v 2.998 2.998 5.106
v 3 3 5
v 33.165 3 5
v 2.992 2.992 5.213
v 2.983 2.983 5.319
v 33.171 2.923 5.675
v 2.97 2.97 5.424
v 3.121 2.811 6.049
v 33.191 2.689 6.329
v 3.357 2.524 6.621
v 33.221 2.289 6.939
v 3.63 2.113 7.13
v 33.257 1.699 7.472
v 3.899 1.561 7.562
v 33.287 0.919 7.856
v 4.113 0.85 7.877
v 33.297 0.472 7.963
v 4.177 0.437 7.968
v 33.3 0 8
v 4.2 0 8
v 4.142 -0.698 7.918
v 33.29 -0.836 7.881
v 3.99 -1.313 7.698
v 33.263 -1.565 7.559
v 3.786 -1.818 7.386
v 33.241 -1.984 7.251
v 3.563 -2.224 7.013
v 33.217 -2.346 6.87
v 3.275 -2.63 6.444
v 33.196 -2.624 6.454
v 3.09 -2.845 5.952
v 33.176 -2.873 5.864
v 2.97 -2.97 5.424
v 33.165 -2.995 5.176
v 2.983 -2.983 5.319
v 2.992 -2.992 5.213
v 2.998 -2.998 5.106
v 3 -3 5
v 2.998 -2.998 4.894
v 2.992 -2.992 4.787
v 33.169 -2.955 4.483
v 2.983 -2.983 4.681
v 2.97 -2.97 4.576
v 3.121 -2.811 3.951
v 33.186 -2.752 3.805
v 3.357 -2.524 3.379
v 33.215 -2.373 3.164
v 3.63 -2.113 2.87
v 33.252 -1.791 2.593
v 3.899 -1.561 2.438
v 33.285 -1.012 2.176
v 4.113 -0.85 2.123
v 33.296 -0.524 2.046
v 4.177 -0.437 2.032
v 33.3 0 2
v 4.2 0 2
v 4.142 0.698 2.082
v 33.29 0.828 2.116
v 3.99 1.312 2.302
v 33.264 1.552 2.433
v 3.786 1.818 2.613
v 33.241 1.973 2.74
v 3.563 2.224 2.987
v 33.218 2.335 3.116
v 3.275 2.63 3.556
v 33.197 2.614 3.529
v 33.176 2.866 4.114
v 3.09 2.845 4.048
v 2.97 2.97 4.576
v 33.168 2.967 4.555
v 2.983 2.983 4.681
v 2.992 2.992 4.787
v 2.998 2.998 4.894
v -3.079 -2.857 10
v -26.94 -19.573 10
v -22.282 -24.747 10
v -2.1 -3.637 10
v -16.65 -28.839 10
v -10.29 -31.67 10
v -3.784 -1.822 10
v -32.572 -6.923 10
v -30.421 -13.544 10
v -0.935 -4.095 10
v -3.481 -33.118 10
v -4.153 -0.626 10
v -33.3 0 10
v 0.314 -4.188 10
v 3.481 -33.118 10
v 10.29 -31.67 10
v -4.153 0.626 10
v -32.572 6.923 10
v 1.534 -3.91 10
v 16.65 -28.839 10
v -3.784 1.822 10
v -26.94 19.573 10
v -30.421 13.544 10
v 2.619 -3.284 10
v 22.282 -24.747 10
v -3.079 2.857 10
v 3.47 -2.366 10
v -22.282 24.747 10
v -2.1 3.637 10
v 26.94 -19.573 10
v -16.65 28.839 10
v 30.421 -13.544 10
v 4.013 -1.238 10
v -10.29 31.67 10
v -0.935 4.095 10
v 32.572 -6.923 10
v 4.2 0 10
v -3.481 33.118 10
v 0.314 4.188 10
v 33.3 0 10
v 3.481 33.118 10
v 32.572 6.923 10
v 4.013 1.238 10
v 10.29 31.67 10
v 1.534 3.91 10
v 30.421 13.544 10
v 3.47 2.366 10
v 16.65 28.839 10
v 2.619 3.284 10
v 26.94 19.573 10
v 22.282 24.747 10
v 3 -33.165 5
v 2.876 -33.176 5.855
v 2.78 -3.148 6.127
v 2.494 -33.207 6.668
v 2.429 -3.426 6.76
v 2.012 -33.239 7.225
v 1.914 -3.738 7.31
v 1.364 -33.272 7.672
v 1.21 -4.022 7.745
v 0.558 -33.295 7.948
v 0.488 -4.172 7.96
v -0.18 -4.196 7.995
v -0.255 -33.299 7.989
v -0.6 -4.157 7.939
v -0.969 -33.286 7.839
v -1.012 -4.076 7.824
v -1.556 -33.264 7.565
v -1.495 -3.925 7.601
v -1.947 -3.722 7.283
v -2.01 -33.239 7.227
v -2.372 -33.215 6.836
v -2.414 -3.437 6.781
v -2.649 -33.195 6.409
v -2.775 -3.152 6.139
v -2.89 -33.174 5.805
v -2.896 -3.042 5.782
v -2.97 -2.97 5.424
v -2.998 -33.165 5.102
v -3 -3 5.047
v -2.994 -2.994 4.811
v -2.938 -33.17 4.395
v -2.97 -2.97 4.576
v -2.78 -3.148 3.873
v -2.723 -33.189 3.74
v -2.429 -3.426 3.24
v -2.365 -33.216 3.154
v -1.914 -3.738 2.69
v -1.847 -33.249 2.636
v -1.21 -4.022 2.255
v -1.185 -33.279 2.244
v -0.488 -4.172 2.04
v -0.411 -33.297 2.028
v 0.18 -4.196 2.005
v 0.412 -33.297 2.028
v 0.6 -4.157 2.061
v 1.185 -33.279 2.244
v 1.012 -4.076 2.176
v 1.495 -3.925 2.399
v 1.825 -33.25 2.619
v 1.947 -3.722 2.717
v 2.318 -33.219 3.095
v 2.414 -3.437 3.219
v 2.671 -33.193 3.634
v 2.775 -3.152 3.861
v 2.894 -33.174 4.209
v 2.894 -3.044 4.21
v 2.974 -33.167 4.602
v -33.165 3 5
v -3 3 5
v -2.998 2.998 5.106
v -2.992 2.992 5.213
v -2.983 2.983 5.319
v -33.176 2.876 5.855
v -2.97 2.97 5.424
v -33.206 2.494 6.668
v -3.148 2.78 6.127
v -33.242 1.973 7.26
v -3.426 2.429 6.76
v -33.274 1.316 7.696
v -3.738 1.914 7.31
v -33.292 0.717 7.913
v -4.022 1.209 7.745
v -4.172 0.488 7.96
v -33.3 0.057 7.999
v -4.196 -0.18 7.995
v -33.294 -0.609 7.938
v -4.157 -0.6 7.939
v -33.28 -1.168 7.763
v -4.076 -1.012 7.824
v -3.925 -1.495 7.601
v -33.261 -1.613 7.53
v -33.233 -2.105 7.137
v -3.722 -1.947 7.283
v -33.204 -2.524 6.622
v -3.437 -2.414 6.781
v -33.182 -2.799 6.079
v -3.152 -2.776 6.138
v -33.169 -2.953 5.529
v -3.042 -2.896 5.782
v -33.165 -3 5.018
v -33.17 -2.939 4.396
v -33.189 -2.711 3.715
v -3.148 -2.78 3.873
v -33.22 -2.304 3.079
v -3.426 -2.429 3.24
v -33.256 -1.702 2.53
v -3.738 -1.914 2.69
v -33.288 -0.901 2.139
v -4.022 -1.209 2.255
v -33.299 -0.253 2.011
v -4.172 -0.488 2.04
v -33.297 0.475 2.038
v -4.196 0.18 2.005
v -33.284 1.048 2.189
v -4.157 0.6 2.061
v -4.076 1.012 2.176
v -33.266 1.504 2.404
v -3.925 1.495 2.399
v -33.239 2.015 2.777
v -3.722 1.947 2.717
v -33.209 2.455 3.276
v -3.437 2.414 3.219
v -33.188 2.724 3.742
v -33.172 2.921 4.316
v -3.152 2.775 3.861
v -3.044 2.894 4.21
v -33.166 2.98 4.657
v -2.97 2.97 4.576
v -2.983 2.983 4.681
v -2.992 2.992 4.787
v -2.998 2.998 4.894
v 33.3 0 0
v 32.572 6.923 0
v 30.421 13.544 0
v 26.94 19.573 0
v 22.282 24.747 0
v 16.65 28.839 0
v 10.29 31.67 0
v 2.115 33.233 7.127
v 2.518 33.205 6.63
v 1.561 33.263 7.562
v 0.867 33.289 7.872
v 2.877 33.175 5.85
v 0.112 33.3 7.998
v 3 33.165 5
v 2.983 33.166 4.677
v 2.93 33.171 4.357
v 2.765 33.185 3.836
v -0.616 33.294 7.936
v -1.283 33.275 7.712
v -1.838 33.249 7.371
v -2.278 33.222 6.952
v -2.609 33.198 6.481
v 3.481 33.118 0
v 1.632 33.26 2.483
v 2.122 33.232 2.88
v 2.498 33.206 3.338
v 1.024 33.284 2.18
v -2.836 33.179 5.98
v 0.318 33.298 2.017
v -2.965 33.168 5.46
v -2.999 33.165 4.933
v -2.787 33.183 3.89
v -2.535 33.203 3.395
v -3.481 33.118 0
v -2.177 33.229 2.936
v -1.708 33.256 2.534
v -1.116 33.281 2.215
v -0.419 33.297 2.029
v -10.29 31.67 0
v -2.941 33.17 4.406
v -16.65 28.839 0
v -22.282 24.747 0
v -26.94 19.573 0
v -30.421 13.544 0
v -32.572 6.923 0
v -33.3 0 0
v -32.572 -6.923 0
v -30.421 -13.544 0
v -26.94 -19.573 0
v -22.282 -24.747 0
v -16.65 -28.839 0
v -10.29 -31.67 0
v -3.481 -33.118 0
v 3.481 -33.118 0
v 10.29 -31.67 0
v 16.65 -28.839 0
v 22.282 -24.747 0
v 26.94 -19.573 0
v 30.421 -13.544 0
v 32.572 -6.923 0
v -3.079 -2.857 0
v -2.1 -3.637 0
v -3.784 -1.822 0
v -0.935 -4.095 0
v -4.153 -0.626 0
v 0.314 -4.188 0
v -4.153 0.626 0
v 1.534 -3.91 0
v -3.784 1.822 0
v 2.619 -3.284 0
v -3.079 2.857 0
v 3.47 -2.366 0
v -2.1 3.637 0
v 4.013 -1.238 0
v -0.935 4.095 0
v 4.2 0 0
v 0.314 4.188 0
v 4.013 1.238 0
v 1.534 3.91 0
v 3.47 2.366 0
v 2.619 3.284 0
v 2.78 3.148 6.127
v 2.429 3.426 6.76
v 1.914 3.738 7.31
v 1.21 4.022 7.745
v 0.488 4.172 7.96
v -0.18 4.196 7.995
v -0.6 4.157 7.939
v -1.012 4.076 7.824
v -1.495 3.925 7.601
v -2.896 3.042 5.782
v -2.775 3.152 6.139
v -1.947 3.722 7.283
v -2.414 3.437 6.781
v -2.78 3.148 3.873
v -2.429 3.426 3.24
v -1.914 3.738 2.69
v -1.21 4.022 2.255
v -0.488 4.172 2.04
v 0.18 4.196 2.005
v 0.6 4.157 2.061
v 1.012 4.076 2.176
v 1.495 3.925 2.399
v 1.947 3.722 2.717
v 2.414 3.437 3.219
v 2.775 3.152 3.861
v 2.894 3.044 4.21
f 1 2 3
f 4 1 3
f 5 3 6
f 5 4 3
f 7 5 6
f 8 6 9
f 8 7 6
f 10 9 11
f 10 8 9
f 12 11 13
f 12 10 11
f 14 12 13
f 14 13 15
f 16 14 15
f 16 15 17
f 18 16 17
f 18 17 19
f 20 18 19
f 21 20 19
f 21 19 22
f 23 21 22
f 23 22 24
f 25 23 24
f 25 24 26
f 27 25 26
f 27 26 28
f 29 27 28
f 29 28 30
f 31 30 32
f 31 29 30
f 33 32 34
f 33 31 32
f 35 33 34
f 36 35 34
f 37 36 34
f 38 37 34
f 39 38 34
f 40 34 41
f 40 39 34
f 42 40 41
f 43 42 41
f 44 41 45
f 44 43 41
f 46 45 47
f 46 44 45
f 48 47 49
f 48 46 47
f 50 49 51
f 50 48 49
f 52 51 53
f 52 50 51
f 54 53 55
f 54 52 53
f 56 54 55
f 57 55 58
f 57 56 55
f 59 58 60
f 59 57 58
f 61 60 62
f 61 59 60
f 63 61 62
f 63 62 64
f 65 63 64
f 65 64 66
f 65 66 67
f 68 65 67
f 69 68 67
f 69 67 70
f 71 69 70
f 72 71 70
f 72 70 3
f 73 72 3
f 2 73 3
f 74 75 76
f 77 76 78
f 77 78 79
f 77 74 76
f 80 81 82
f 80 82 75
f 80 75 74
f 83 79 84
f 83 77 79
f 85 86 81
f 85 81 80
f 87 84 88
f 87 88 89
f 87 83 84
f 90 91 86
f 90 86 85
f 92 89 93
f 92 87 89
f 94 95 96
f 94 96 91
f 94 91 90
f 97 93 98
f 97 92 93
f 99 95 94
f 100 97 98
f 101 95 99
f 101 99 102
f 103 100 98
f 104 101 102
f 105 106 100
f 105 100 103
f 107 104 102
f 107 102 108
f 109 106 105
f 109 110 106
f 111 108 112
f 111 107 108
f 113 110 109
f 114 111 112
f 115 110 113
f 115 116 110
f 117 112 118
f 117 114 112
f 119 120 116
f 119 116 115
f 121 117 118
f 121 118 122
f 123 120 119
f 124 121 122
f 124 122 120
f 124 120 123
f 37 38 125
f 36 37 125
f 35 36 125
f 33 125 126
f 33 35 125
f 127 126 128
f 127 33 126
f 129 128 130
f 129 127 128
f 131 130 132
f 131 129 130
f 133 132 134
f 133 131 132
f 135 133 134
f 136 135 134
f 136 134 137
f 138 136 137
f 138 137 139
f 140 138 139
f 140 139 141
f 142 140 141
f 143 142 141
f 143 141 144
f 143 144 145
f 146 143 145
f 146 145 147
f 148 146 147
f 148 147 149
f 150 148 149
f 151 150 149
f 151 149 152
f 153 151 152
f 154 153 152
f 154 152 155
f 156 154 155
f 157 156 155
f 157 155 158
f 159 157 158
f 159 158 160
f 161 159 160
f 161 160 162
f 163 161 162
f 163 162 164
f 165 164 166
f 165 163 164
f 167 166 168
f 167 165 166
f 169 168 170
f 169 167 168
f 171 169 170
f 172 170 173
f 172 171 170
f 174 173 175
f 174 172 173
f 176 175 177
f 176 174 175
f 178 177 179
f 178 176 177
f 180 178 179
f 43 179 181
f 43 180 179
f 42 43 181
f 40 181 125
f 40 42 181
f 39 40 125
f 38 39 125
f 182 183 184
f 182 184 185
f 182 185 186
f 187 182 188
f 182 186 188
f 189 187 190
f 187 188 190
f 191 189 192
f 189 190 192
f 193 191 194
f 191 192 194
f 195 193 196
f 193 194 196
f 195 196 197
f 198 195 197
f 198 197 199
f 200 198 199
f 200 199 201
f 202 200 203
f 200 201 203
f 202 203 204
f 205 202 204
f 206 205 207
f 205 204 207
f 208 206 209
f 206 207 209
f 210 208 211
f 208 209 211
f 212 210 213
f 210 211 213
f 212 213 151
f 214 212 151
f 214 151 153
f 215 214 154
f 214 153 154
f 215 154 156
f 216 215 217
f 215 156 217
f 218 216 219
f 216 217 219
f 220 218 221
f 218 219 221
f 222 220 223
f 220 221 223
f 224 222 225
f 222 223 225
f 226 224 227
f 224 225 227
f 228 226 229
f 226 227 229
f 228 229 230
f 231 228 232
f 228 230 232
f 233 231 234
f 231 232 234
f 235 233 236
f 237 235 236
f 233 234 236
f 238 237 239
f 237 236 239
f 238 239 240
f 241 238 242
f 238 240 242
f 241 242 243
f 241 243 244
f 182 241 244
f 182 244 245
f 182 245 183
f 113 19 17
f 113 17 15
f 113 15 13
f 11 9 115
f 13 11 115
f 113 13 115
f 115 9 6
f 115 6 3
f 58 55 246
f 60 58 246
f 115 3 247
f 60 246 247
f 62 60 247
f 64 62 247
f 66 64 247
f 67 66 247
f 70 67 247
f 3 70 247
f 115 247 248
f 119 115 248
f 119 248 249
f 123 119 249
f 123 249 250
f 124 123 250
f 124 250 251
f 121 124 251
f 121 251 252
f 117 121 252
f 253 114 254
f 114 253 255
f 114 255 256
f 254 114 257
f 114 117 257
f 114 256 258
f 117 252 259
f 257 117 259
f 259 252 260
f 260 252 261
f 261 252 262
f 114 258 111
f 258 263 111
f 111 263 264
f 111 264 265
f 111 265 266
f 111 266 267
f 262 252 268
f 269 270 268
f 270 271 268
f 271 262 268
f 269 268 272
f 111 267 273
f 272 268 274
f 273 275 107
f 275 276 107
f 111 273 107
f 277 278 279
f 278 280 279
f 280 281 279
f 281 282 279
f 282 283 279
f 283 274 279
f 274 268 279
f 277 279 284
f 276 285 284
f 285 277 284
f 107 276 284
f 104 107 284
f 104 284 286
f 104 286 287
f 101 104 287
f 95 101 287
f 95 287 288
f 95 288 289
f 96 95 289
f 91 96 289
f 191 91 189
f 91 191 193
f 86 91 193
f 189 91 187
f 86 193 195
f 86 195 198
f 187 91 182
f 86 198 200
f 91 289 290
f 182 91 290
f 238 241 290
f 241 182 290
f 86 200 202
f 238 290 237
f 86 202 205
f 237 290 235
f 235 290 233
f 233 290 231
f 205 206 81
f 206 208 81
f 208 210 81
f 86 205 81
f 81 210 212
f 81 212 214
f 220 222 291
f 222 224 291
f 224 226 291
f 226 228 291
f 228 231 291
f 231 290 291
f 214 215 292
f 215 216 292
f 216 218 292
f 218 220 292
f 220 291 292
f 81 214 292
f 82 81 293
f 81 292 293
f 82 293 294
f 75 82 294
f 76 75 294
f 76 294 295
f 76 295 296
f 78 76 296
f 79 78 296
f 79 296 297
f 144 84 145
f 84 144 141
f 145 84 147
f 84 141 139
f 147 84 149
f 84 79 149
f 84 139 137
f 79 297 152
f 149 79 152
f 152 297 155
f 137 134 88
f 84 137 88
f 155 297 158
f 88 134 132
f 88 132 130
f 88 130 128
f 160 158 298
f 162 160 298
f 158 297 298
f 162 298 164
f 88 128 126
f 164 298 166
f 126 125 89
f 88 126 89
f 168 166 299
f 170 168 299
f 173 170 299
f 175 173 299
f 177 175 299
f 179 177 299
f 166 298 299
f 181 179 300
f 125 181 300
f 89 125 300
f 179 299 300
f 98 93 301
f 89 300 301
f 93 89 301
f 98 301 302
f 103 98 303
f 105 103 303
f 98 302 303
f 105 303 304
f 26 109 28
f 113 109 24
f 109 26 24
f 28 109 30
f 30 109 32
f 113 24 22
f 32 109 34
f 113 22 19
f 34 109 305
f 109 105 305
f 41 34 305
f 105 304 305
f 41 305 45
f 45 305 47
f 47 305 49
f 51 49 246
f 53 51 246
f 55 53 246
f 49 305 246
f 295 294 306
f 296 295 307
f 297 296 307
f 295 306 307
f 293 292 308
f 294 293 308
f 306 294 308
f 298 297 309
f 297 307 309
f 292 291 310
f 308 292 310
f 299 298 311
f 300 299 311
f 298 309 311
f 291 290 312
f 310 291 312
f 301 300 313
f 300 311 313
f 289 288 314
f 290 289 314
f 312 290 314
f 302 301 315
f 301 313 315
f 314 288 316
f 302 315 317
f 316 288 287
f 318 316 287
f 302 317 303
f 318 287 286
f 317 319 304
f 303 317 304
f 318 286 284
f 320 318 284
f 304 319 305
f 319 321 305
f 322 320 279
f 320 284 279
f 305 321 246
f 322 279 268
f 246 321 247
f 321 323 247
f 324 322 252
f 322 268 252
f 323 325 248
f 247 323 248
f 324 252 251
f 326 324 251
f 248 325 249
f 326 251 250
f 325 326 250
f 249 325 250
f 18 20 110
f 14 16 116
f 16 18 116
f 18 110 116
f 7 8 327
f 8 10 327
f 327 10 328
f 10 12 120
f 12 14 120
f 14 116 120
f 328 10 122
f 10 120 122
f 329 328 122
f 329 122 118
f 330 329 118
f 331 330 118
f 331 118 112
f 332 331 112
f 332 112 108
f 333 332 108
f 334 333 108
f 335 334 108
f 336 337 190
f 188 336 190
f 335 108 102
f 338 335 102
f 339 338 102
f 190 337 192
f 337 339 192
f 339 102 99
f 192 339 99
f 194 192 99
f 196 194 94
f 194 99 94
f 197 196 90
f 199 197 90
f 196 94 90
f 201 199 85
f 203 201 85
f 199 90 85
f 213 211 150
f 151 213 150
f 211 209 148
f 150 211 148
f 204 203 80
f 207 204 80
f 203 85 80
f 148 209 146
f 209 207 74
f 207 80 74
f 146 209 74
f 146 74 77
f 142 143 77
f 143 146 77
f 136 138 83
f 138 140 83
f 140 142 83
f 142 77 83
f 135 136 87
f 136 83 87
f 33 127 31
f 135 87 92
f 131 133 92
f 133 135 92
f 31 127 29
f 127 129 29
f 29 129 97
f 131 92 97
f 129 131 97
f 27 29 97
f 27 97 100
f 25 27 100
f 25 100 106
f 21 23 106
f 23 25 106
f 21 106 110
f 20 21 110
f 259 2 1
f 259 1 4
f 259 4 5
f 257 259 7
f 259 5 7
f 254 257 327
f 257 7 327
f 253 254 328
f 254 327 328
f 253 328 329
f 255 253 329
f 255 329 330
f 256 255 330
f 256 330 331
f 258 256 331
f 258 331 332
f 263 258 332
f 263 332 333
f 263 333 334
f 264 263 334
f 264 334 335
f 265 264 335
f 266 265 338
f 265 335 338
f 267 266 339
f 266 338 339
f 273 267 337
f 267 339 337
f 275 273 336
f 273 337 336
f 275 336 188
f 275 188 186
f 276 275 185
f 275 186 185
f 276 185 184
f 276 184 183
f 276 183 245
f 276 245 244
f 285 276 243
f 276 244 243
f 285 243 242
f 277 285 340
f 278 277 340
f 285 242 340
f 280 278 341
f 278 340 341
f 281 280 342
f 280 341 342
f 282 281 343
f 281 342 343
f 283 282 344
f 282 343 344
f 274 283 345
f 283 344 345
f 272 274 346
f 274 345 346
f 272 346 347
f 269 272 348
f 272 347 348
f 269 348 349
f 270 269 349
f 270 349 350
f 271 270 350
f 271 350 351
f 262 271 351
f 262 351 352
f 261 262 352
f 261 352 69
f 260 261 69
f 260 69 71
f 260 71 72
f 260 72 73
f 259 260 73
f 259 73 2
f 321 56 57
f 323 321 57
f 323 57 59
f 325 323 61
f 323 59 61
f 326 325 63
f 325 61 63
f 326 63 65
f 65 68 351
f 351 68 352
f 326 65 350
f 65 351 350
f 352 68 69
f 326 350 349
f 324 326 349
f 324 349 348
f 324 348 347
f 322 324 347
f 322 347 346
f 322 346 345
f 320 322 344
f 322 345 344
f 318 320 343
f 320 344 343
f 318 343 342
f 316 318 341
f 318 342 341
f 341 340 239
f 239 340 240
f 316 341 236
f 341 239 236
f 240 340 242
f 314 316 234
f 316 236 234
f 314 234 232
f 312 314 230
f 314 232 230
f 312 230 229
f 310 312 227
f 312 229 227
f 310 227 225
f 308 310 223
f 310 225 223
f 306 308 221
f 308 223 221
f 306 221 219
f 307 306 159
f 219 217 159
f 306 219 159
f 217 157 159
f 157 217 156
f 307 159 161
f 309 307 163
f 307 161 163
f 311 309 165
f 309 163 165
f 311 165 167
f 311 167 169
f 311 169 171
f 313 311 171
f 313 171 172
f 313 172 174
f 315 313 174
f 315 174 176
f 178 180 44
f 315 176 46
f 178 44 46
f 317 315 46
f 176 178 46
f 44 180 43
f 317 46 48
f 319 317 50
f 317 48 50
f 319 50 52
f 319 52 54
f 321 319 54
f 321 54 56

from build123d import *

# Parameters (mm, degrees)
SKETCH008_R          = 33.3
PAD004_DEPTH         = 10
SKETCH009_R          = 3
POCKET004_DEPTH      = 100
POCKET004_DEPTH_BACK = 100
SKETCH010_R          = 3
POCKET005_DEPTH      = 100
POCKET005_DEPTH_BACK = 100
SKETCH011_R          = 4.2
POCKET006_DEPTH      = 10.001


with BuildPart() as part:
    # Sketch008 → Pad004 (new body)
    with BuildSketch(Plane.XY):
        Circle(SKETCH008_R)
    extrude(amount=PAD004_DEPTH)

    # Sketch009 → Pocket004 (cut, two sides)
    with BuildSketch(Plane.YZ) as pocket004_sk:
        with Locations((0, 5)):
            Circle(SKETCH009_R)
    extrude(amount=-POCKET004_DEPTH, mode=Mode.SUBTRACT)
    extrude(pocket004_sk.sketch, amount=POCKET004_DEPTH_BACK, mode=Mode.SUBTRACT)

    # Sketch010 → Pocket005 (cut, two sides)
    with BuildSketch(Plane.XZ) as pocket005_sk:
        with Locations((0, 5)):
            Circle(SKETCH010_R)
    extrude(amount=-POCKET005_DEPTH, mode=Mode.SUBTRACT)
    extrude(pocket005_sk.sketch, amount=POCKET005_DEPTH_BACK, mode=Mode.SUBTRACT)

    # Sketch011 (on Face3 of Pocket005) → Pocket006 (cut, through all)
    with BuildSketch(Plane.XY.offset(10)):
        Circle(SKETCH011_R)
    extrude(amount=-POCKET006_DEPTH, mode=Mode.SUBTRACT)


solid = part.part
